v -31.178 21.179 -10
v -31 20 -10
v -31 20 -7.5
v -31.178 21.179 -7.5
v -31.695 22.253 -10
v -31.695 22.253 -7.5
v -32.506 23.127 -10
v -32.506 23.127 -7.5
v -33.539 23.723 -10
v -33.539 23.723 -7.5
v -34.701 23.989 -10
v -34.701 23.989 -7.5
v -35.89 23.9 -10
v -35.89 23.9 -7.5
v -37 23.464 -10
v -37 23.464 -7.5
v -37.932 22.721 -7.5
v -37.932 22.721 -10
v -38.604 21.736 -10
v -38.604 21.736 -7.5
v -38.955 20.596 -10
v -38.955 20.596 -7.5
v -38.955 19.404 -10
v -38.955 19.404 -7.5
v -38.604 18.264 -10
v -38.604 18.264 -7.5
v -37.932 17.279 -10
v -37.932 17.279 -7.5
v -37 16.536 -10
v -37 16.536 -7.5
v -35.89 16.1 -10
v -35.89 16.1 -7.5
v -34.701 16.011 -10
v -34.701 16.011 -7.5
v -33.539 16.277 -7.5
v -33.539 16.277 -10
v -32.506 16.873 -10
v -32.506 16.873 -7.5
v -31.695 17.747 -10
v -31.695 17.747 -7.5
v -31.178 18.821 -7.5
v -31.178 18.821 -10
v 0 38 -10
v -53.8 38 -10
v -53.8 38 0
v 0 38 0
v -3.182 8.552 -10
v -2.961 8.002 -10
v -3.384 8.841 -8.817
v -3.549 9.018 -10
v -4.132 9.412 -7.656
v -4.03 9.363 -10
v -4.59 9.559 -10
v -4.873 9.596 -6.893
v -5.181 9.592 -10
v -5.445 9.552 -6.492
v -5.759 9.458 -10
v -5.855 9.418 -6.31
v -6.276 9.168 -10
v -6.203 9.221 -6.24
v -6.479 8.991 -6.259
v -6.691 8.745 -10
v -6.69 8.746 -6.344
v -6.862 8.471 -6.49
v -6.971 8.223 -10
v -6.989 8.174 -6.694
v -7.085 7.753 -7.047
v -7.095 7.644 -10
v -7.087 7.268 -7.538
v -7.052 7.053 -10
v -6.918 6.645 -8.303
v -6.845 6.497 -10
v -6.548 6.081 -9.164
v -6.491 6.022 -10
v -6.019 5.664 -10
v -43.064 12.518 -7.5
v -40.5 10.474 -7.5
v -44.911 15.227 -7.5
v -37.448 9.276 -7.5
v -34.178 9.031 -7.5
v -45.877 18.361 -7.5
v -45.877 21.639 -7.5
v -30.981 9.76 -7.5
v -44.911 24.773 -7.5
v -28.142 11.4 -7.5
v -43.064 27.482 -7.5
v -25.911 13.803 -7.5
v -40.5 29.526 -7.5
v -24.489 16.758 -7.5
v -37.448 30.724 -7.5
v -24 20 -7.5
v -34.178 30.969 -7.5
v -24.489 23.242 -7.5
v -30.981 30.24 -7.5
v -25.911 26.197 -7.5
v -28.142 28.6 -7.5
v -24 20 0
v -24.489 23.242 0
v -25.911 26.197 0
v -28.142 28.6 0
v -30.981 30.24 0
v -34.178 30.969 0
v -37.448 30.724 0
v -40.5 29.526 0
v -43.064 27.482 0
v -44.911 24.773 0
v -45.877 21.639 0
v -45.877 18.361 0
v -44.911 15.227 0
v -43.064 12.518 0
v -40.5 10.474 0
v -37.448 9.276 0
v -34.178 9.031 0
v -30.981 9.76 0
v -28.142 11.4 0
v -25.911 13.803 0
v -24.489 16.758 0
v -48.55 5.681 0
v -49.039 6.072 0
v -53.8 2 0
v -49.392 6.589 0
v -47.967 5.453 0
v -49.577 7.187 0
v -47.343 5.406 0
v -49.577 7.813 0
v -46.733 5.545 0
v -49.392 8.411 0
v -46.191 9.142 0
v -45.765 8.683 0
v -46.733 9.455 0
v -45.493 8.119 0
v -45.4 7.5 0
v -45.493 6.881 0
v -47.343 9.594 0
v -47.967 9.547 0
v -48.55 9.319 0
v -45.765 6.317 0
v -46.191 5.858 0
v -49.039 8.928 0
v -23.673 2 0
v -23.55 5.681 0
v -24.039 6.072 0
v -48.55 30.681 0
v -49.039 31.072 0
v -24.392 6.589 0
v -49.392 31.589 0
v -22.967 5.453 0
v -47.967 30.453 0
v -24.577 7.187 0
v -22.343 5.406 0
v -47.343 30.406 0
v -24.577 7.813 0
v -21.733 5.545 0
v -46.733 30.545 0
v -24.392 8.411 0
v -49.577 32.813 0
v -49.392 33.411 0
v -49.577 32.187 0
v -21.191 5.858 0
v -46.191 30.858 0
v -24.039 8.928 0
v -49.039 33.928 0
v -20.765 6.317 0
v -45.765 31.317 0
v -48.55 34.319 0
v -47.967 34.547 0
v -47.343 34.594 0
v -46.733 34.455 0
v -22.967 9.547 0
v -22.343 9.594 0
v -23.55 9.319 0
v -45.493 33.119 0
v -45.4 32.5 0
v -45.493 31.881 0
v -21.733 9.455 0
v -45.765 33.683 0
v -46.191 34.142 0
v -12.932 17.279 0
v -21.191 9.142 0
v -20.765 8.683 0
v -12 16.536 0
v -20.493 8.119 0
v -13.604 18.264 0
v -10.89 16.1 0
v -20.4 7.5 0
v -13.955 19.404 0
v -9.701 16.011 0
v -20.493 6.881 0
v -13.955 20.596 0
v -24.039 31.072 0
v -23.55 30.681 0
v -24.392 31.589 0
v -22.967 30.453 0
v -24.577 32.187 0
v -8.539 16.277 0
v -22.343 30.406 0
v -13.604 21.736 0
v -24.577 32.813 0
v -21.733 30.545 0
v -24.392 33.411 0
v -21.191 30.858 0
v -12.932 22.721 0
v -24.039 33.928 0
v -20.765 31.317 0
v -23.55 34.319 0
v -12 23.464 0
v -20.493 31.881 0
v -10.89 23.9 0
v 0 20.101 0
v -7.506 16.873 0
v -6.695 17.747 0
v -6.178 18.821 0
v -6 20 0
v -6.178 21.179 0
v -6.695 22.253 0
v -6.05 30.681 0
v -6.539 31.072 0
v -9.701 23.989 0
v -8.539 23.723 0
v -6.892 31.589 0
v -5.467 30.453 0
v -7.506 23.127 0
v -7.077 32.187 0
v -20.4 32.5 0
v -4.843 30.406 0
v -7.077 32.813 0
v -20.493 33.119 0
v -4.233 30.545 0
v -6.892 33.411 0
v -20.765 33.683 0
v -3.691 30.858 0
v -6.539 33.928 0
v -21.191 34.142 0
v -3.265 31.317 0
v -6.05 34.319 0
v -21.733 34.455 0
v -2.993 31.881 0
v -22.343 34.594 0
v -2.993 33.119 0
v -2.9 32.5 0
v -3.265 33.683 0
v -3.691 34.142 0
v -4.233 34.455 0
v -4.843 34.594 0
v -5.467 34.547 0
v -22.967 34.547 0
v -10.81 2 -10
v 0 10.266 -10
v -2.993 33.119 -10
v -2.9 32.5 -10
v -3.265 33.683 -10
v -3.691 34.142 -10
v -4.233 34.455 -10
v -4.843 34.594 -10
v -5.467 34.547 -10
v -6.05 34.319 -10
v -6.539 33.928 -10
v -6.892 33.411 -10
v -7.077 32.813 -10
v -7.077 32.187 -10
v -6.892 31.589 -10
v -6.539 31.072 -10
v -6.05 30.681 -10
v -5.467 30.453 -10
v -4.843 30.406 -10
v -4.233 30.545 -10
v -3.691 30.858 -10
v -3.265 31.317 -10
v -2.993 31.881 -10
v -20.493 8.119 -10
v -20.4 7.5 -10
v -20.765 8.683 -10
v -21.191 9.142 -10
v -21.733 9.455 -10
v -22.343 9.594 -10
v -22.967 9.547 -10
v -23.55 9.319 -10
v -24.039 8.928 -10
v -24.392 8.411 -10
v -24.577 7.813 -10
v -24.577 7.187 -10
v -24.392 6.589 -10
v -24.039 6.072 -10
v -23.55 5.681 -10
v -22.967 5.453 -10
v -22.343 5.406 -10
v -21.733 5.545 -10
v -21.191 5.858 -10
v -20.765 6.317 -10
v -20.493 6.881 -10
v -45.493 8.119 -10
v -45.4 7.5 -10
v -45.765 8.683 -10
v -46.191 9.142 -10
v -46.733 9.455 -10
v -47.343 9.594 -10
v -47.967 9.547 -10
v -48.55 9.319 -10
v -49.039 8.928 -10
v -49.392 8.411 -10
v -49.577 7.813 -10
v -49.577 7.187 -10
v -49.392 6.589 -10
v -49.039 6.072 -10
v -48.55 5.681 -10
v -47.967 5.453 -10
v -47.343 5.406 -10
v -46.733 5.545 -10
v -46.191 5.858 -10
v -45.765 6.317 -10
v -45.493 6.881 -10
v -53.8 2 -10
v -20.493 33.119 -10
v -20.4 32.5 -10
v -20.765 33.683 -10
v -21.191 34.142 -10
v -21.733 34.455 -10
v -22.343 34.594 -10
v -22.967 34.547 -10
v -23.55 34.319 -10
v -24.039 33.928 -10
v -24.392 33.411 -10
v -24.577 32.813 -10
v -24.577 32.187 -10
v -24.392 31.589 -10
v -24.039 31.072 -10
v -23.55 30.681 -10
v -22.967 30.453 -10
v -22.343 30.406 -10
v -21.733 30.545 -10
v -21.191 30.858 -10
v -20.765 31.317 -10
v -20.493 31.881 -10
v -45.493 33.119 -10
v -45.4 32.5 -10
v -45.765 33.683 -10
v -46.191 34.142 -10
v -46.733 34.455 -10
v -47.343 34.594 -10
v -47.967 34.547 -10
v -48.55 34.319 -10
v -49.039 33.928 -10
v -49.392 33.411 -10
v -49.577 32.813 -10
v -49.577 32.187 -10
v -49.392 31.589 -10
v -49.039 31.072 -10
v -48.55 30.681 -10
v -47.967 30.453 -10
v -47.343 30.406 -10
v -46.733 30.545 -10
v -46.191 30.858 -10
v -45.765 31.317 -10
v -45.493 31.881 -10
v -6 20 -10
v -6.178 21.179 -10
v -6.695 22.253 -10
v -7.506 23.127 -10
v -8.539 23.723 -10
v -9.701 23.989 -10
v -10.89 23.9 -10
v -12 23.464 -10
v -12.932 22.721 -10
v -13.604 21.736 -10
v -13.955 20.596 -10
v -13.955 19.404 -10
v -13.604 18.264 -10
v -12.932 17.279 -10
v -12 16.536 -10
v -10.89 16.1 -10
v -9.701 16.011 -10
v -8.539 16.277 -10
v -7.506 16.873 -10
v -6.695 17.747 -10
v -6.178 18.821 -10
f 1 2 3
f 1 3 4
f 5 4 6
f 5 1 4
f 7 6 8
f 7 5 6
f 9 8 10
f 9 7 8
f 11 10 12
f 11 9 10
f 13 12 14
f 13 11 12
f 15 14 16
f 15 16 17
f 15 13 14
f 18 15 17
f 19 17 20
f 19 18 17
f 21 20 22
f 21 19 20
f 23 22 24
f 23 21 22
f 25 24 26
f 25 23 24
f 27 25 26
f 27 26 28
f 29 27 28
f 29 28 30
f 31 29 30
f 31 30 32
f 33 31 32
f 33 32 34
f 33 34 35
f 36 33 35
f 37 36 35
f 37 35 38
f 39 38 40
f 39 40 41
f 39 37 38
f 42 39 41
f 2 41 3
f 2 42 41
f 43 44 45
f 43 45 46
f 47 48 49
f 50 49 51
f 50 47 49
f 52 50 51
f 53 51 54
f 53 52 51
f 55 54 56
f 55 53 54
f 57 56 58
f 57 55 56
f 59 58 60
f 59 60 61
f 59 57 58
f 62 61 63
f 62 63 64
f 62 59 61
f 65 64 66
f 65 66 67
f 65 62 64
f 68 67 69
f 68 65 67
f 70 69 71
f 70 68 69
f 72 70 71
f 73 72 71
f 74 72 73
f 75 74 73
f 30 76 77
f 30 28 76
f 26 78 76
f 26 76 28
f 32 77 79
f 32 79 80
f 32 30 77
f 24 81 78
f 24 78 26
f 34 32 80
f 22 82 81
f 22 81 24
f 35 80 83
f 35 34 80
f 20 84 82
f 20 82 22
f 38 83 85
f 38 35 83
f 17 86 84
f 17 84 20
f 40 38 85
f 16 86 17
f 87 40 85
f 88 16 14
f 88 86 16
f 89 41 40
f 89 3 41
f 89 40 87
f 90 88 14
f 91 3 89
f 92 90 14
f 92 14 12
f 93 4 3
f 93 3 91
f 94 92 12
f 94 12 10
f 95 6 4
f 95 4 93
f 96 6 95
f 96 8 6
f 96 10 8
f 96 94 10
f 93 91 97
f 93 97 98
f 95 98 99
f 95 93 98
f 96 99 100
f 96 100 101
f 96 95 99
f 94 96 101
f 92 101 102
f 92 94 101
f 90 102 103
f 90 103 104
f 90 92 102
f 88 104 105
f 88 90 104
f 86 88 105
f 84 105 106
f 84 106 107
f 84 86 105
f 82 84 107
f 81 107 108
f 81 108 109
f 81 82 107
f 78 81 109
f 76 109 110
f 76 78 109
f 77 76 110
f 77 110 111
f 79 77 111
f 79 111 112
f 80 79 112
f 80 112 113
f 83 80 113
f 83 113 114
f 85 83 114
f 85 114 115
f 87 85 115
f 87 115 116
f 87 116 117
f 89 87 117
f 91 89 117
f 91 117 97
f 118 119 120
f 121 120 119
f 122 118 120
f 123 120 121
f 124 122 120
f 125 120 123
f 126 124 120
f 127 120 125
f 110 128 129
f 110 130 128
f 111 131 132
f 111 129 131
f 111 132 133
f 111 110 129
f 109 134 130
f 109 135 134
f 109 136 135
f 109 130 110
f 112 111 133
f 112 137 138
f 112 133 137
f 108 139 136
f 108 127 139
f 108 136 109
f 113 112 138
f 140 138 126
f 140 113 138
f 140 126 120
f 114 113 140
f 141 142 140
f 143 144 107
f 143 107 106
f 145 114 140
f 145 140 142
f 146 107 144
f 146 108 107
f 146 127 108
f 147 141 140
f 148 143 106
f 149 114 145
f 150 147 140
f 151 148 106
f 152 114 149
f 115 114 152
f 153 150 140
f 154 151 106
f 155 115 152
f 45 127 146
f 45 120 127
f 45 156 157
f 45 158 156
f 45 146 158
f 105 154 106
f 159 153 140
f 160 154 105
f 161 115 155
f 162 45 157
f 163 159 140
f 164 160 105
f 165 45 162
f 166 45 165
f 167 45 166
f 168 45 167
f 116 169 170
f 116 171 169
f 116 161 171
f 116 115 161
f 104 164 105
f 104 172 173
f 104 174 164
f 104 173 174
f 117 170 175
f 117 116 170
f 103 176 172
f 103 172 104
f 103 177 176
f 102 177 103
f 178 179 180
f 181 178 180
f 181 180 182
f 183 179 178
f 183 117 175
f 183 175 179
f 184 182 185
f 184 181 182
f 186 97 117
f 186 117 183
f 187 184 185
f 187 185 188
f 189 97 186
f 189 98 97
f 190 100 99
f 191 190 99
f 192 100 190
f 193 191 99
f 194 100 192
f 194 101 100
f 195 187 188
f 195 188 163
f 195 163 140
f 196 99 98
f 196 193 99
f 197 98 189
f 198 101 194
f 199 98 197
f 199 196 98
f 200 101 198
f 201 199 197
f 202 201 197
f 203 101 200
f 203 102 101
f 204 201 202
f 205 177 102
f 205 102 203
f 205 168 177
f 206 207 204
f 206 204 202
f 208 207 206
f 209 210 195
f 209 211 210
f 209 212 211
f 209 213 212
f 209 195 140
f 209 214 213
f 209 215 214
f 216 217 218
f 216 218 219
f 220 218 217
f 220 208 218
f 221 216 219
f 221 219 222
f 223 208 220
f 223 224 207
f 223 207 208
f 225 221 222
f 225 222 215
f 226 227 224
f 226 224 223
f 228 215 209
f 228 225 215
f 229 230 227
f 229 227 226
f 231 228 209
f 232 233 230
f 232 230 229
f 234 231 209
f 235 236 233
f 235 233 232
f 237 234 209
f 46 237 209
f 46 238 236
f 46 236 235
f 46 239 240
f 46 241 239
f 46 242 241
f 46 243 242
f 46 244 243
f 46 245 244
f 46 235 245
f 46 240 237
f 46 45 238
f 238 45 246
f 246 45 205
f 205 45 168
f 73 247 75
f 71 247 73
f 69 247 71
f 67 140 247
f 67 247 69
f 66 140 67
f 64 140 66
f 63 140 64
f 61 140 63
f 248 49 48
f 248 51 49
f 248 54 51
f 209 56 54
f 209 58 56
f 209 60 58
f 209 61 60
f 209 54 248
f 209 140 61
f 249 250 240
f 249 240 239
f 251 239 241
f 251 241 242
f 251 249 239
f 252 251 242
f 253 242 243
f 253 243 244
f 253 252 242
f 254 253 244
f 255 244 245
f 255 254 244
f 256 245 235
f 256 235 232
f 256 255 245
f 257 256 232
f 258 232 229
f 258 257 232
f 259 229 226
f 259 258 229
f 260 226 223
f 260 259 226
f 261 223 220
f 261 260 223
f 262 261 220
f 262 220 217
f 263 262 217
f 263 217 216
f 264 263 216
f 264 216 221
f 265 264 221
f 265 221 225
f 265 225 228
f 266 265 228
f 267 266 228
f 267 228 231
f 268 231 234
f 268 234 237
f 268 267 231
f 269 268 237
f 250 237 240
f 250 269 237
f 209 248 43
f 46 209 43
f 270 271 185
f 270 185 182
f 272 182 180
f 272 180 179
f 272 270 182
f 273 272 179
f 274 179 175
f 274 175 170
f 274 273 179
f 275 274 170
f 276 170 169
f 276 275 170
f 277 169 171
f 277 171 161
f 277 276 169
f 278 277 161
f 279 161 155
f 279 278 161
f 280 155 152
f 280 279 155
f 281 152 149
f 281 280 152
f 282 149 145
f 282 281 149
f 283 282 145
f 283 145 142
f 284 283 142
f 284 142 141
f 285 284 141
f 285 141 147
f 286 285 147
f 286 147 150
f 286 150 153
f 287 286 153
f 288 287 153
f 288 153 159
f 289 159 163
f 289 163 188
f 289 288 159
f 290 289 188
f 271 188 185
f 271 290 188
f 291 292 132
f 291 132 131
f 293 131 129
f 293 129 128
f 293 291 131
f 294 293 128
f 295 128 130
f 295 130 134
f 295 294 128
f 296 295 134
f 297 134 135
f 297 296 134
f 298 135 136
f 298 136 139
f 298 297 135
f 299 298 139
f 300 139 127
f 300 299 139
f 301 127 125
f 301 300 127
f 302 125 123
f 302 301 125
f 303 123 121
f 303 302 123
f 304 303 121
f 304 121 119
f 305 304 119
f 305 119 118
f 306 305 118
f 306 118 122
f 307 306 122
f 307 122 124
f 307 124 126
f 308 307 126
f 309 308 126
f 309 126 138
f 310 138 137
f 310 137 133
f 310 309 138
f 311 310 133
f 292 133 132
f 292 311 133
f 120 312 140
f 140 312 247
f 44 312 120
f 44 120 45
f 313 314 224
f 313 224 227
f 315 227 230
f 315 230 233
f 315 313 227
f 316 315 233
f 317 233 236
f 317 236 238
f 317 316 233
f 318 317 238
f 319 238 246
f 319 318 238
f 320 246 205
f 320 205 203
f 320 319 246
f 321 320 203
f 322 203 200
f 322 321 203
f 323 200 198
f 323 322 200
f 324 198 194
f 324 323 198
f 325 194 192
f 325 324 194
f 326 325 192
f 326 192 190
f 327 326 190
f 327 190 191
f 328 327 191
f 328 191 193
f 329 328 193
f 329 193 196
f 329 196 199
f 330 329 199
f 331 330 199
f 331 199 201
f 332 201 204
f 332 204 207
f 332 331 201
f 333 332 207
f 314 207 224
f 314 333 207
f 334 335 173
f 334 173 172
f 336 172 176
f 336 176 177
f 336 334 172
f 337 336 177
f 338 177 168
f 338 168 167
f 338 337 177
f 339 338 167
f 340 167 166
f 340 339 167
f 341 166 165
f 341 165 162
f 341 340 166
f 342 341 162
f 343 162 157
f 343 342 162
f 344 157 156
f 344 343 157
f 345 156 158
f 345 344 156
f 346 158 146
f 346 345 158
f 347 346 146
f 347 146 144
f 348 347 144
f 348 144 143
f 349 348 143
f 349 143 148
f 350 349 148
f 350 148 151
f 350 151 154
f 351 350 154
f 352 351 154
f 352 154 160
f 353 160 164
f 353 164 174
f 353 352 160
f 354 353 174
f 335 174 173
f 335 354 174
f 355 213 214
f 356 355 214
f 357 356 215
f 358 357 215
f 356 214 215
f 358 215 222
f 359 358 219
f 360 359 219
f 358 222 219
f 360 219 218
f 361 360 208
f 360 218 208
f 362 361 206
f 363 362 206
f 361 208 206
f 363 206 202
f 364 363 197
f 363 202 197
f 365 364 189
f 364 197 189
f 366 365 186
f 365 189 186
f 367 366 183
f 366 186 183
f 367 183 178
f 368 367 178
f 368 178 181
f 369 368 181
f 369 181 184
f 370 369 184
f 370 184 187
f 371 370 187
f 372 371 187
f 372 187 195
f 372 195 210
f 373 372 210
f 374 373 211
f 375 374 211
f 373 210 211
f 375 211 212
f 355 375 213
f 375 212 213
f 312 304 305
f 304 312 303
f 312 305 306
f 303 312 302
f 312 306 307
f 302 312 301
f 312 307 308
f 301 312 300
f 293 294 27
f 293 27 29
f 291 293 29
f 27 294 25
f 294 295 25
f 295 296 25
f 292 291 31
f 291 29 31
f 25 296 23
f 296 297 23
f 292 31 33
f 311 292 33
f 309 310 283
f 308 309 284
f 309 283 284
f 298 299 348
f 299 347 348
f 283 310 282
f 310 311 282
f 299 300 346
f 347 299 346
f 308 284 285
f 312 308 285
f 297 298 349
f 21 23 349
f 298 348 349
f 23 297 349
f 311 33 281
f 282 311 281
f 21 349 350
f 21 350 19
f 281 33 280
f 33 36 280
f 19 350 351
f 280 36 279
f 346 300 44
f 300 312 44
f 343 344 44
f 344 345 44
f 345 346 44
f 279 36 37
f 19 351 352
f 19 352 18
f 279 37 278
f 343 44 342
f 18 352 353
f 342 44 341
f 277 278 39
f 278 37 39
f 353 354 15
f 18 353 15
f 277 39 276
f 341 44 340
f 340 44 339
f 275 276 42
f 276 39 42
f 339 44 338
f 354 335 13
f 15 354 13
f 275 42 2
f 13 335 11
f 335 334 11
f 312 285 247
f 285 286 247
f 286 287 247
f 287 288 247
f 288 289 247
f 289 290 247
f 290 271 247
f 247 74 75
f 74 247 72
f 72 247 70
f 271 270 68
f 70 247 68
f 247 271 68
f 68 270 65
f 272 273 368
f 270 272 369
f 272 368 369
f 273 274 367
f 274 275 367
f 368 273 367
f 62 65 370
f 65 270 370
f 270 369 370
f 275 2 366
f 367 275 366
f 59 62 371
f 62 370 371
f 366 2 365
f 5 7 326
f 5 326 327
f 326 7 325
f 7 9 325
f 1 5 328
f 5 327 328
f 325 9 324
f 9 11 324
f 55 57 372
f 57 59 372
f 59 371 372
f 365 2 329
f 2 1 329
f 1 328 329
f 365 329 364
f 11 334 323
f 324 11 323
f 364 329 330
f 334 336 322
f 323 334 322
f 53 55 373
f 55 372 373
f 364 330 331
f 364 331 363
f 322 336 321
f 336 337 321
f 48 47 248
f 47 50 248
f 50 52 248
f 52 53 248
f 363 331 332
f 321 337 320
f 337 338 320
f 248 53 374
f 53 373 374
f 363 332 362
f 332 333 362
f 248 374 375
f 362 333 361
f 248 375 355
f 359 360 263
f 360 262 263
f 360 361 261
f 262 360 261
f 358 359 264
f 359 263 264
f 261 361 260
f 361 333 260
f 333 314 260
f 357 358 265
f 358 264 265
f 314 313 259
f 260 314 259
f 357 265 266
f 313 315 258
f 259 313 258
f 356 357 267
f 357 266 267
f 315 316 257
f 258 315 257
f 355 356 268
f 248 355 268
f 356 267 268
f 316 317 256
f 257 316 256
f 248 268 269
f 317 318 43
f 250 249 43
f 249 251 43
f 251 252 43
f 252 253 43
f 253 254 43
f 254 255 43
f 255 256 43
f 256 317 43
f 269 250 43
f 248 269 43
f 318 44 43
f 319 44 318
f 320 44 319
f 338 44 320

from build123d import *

# Parameters (mm, degrees)
JOTYY_MIRRORED_START         = -10
JOTYY_MIRRORED_OUTLINE_W     = 53.8
JOTYY_MIRRORED_OUTLINE_H     = 36
JOTYY_MIRRORED_OUTLINE_R     = 2.1
JOTYY_MIRRORED_OUTLINE_R_2   = 11
JOTYY_MIRRORED_DEPTH         = 10
JOTYY_MIRRORED_2_OUTLINE_R   = 11
JOTYY_MIRRORED_2_OUTLINE_R_2 = 4
JOTYY_MIRRORED_2_DEPTH       = 2.5
SKETCH1_R                    = 4
CUT_EXTRUDE1_DEPTH           = 10
CUT_EXTRUDE2_DEPTH           = 58.009529002


# Read off the part's stored shape, not the designer's step: jotyy_Mirrored
with BuildPart() as part:
    # jotyy_Mirrored outline → jotyy_Mirrored (new body)
    with BuildSketch(Plane.XY.offset(JOTYY_MIRRORED_START)):
        with Locations((-26.9, 20)):
            Rectangle(JOTYY_MIRRORED_OUTLINE_W, JOTYY_MIRRORED_OUTLINE_H)
        with Locations((-47.5, 7.5)):
            Circle(JOTYY_MIRRORED_OUTLINE_R, mode=Mode.SUBTRACT)
        with Locations((-22.5, 7.5)):
            Circle(JOTYY_MIRRORED_OUTLINE_R, mode=Mode.SUBTRACT)
        with Locations((-5, 7.5)):
            Circle(JOTYY_MIRRORED_OUTLINE_R, mode=Mode.SUBTRACT)
        with Locations((-35, 20)):
            Circle(JOTYY_MIRRORED_OUTLINE_R_2, mode=Mode.SUBTRACT)
        with Locations((-47.5, 32.5)):
            Circle(JOTYY_MIRRORED_OUTLINE_R, mode=Mode.SUBTRACT)
        with Locations((-22.5, 32.5)):
            Circle(JOTYY_MIRRORED_OUTLINE_R, mode=Mode.SUBTRACT)
        with Locations((-5, 32.5)):
            Circle(JOTYY_MIRRORED_OUTLINE_R, mode=Mode.SUBTRACT)
    extrude(amount=JOTYY_MIRRORED_DEPTH)

    # jotyy_Mirrored 2 outline → jotyy_Mirrored 2 (add)
    with BuildSketch(Plane.XY.offset(JOTYY_MIRRORED_START)):
        with Locations((-35, 20)):
            Circle(JOTYY_MIRRORED_2_OUTLINE_R)
        with Locations((-35, 20)):
            Circle(JOTYY_MIRRORED_2_OUTLINE_R_2, mode=Mode.SUBTRACT)
    extrude(amount=JOTYY_MIRRORED_2_DEPTH)

    # Sketch1 → Cut-Extrude1 (cut)
    with BuildSketch(Plane.XY):
        with Locations((-10, 20)):
            Circle(SKETCH1_R)
    extrude(amount=-CUT_EXTRUDE1_DEPTH, mode=Mode.SUBTRACT)

    # Sketch4 → Cut-Extrude2 (cut, through all)
    with BuildSketch(Plane(origin=(-6.022770261, 7.876766856, -7.746840682), x_dir=(-0.8770067574433524, -0.3073815854436153, 0.36929081809444725), z_dir=(-0.4786451376421942, 0.6259870446034146, -0.6156614753256595))):
        Polygon((61.660399682, 43.281573414), (-67.322963421, -199.854992021), (-184.813959978, -137.526300969), (-55.830596875, 105.610264465), align=None)
    extrude(amount=-CUT_EXTRUDE2_DEPTH, mode=Mode.SUBTRACT)


solid = part.part
